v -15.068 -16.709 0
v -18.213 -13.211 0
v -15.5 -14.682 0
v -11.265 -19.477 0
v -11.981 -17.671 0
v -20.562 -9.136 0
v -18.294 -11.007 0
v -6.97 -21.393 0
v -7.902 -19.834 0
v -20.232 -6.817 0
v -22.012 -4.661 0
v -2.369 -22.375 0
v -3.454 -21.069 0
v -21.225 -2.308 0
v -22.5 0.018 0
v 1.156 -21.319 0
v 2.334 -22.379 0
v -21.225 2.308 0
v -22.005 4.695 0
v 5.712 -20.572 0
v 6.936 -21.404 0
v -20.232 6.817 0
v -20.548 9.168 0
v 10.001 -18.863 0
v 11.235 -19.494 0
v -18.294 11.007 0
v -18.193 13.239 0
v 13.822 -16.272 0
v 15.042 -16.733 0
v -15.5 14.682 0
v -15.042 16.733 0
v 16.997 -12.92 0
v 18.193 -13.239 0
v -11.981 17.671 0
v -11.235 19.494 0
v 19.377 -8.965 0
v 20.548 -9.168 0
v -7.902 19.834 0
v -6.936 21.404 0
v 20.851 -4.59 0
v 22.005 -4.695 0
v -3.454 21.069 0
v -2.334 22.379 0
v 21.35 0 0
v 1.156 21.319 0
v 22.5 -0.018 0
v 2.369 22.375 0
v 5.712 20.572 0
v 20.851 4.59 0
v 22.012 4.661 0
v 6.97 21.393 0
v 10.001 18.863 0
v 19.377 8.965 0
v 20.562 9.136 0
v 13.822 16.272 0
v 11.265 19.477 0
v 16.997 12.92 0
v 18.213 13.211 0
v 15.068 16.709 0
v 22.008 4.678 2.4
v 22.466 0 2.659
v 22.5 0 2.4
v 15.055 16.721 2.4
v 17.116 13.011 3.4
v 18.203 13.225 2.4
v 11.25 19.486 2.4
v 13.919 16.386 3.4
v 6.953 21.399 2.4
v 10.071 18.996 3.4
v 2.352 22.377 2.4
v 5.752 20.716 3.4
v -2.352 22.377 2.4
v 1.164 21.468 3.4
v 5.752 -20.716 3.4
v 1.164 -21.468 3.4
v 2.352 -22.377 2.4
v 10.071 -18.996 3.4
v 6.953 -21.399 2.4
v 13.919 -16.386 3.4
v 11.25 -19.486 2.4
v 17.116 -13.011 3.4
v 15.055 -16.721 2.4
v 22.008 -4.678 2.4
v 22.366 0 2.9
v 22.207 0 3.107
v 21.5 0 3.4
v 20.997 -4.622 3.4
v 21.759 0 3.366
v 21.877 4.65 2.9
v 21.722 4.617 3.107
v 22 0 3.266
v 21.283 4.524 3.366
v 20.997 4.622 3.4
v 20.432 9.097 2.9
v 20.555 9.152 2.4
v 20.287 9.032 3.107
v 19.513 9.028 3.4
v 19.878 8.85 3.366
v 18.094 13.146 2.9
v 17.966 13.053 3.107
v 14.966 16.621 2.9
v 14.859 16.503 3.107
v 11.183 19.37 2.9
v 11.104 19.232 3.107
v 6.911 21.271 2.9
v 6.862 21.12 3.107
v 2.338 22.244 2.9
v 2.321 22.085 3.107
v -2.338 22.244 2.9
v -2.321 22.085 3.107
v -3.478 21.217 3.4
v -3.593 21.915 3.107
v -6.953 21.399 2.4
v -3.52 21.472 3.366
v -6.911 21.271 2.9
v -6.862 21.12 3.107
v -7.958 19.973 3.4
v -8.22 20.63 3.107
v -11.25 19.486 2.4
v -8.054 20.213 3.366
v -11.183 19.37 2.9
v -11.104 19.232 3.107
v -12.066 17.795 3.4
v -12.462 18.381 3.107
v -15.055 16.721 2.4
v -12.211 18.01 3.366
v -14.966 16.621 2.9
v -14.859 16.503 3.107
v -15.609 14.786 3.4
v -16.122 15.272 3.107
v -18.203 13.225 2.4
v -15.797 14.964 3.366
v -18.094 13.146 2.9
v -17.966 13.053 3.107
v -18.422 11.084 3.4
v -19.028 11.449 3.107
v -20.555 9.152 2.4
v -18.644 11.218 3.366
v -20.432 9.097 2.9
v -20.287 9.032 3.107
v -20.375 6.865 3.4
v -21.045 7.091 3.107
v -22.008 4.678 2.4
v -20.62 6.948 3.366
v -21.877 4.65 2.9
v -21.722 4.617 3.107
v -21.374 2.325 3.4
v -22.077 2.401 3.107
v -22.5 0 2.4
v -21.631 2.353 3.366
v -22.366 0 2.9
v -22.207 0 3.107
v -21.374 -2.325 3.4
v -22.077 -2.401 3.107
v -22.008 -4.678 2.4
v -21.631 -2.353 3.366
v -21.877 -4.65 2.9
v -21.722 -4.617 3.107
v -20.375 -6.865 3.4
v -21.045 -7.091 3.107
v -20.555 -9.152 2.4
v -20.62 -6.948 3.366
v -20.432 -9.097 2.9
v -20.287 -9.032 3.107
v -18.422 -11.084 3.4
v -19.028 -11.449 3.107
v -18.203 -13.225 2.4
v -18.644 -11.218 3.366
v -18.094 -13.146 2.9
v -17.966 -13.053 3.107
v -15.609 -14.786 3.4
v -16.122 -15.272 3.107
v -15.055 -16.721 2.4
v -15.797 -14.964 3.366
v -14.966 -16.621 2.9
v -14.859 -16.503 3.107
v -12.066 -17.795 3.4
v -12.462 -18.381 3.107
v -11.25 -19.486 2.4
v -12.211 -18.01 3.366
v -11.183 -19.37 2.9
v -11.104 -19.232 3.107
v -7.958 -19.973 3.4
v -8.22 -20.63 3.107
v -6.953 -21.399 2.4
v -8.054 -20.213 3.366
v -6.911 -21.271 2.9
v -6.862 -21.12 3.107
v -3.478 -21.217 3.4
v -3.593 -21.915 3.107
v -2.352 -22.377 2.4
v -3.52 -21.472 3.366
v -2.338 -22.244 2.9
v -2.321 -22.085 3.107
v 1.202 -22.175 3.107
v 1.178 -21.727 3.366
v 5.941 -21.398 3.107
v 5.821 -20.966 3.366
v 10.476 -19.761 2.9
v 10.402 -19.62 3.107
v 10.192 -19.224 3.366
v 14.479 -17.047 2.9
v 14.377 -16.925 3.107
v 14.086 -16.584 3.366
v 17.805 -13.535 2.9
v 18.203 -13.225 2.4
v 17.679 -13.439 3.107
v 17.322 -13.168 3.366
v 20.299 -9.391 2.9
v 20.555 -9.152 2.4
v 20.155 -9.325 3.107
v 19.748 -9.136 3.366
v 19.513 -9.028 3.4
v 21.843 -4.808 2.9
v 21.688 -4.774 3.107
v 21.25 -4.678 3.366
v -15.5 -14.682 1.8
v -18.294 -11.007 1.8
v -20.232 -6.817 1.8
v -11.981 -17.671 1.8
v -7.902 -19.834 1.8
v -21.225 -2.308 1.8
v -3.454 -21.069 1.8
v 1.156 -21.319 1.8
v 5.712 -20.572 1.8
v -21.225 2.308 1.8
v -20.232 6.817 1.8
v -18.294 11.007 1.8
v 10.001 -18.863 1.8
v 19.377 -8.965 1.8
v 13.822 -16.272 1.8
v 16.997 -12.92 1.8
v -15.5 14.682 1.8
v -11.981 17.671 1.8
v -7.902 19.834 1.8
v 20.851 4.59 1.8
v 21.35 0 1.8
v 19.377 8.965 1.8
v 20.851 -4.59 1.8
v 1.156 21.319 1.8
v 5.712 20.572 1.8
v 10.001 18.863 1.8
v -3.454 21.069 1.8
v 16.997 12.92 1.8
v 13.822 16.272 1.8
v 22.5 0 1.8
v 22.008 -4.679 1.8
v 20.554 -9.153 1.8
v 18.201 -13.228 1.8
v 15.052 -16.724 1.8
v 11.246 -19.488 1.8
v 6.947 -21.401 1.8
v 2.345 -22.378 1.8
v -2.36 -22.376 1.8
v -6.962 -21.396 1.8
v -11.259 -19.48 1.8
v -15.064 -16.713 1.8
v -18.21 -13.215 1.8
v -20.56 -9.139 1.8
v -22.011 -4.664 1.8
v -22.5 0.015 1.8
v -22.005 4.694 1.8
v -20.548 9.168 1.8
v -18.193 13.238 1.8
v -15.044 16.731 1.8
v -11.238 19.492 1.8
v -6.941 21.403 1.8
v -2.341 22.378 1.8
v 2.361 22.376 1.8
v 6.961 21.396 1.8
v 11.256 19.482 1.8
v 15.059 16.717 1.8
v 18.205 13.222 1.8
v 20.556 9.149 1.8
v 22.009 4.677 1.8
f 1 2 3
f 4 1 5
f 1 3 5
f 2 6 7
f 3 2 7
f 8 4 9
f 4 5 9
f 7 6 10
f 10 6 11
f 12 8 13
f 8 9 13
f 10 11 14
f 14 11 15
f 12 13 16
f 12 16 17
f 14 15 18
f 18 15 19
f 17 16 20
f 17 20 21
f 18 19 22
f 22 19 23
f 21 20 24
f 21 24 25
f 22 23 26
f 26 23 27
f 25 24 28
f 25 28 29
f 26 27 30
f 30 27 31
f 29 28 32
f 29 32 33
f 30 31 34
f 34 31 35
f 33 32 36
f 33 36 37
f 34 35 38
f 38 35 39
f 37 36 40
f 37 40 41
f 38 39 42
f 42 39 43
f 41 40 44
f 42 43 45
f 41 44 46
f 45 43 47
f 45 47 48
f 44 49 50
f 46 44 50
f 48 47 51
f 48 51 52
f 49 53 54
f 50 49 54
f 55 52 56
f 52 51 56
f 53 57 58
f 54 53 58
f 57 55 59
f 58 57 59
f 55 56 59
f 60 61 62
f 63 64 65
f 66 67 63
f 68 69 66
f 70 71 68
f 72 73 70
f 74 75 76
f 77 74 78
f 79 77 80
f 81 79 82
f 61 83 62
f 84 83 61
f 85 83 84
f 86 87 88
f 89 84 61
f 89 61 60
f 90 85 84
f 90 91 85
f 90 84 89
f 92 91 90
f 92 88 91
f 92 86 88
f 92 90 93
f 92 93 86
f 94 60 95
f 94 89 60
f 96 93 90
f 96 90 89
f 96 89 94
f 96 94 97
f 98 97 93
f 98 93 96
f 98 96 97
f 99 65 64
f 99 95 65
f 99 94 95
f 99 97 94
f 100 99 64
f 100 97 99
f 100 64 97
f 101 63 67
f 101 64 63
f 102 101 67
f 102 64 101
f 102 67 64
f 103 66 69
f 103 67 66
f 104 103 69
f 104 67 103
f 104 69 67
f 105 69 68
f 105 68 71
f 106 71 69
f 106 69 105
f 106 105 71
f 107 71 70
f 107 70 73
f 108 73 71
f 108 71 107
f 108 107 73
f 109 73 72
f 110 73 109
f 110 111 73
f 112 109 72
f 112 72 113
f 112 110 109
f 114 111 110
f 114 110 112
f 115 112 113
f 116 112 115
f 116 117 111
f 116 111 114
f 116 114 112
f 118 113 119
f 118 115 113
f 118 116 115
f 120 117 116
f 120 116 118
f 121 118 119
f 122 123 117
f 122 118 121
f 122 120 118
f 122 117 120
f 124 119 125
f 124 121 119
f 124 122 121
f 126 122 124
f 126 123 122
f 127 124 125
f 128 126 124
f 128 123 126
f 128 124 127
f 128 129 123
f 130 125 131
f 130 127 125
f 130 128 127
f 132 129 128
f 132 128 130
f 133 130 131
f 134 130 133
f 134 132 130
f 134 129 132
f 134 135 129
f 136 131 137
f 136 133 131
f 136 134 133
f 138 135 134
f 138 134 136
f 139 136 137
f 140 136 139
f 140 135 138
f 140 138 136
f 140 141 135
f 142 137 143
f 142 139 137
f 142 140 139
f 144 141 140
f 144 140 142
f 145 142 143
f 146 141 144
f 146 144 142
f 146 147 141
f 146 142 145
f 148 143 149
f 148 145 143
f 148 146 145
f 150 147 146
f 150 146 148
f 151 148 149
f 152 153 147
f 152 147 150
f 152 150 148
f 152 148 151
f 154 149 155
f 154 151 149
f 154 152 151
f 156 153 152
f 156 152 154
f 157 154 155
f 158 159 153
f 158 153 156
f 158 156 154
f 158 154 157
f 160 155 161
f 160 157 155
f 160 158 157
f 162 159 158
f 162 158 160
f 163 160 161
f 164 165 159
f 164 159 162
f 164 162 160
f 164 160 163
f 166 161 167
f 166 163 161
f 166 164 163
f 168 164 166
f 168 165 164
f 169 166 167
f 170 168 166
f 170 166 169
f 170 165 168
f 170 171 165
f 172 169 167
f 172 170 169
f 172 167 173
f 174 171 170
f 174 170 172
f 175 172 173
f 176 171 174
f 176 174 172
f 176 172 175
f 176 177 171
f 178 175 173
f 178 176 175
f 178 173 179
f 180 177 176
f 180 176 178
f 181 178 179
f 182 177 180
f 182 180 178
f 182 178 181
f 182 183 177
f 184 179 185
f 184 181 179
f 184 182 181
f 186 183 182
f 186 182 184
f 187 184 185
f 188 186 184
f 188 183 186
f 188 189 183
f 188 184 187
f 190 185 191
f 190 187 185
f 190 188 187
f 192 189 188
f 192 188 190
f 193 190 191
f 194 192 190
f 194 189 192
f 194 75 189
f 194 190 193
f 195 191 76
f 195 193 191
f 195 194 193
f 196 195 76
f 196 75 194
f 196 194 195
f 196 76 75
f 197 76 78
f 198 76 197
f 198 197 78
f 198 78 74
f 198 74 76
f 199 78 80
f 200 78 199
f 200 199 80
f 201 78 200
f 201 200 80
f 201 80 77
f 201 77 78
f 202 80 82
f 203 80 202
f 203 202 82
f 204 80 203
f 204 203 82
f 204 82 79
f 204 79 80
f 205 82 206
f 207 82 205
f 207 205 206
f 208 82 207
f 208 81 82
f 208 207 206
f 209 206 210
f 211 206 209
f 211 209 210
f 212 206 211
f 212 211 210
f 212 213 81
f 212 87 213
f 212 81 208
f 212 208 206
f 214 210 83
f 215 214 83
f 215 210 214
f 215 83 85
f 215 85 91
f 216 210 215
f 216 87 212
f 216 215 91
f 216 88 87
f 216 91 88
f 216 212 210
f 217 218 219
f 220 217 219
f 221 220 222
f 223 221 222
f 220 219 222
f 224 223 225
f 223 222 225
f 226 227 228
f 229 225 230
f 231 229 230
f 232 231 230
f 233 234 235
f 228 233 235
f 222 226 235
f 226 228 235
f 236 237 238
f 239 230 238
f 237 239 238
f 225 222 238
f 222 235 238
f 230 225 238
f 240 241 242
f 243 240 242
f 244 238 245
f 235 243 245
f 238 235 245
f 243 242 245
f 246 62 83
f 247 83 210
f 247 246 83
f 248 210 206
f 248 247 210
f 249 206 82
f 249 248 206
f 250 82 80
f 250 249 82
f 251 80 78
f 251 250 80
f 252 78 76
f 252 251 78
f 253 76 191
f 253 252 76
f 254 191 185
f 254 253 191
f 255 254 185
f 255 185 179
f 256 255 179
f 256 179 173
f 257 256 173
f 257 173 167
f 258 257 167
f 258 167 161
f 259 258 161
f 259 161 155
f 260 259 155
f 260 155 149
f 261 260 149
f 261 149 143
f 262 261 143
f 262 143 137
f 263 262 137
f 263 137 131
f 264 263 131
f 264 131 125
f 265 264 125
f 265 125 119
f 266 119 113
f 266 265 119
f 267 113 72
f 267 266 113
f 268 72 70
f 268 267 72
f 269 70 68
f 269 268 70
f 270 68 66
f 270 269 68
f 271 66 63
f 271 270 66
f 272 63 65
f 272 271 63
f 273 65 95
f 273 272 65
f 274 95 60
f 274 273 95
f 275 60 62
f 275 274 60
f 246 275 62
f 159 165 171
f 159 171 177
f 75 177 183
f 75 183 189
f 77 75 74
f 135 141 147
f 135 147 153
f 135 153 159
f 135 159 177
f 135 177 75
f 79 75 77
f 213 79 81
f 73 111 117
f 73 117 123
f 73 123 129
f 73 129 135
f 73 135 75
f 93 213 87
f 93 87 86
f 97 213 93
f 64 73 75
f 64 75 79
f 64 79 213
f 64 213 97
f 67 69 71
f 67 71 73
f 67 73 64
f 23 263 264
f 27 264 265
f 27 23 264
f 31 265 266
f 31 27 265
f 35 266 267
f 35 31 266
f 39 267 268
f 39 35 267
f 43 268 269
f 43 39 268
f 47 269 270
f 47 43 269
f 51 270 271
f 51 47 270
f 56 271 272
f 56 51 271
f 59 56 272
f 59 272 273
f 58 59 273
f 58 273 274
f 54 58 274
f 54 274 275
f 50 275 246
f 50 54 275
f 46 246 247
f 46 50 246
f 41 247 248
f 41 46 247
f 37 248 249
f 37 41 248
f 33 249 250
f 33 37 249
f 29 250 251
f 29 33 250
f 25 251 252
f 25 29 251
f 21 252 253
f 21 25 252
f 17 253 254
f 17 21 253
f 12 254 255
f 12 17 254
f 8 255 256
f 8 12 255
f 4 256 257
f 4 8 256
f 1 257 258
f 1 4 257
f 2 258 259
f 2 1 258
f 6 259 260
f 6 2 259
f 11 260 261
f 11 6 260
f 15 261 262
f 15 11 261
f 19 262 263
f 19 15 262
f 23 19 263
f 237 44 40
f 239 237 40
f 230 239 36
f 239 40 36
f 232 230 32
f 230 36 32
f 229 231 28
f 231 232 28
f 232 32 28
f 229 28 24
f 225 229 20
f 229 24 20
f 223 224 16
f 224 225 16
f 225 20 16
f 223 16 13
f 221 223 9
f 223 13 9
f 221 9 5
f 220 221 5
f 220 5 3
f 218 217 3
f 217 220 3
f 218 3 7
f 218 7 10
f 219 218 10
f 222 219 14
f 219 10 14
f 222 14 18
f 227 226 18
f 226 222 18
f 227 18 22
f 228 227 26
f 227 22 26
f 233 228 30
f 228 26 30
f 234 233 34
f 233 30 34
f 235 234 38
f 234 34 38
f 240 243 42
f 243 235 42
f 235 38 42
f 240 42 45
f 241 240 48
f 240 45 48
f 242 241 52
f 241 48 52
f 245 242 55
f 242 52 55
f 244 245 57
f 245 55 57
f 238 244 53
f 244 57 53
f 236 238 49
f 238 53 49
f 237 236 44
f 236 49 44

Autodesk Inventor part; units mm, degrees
ref_plane "YZ Plane" through (0, 0, 0) normal (1, 0, 0) x (0, 1, 0)
ref_plane "XZ Plane" through (0, 0, 0) normal (0, 1, 0) x (-1, 0, 0)
ref_plane "Arbeitsebene1" through (0, 0, 0) normal (0, 0, 1) x (1, 0, 0)
sketch "Skizze1" plane through (0, 0, 0) normal (0, 0, 1) x (1, 0, 0)
  arc A0 (20.5477, -9.1676) -> (20.5477, 9.1676) centre (0, 0) ccw projected
  arc A1 (20.5477, 9.1676) -> (-20.5477, 9.1676) centre (0, 0) ccw projected
  arc A2 (-20.5477, 9.1676) -> (-20.5477, -9.1676) centre (0, 0) ccw projected
  arc A3 (-20.5477, -9.1676) -> (20.5477, -9.1676) centre (0, 0) ccw projected
  circle A4 centre (0, 0) radius 21.25 projected
  circle A5 centre (0, 0) radius 21.35
  dimension "d0" = 0.1
ref_plane "Arbeitsebene2" through (-21.25, -21.25, 1.8) normal (0, 0, 1) x (1, 0, 0)
extrude "Extrusion1" add sketch "Skizze1" along normal up to surface (1.8 mm away) contours A3 A2 A1 A0
sketch "Skizze2" plane through (0, 0, 1.8) normal (0, 0, 1) x (1, 0, 0)
  circle A0 centre (0, 0) radius 22.5
extrude "Extrusion2" add sketch "Skizze2" along normal blind 1.6
fillet "Rundung1" radius 1 1 edges at (-22.5, 0, 3.4)
properties part number "totmannschalter_deckel"
